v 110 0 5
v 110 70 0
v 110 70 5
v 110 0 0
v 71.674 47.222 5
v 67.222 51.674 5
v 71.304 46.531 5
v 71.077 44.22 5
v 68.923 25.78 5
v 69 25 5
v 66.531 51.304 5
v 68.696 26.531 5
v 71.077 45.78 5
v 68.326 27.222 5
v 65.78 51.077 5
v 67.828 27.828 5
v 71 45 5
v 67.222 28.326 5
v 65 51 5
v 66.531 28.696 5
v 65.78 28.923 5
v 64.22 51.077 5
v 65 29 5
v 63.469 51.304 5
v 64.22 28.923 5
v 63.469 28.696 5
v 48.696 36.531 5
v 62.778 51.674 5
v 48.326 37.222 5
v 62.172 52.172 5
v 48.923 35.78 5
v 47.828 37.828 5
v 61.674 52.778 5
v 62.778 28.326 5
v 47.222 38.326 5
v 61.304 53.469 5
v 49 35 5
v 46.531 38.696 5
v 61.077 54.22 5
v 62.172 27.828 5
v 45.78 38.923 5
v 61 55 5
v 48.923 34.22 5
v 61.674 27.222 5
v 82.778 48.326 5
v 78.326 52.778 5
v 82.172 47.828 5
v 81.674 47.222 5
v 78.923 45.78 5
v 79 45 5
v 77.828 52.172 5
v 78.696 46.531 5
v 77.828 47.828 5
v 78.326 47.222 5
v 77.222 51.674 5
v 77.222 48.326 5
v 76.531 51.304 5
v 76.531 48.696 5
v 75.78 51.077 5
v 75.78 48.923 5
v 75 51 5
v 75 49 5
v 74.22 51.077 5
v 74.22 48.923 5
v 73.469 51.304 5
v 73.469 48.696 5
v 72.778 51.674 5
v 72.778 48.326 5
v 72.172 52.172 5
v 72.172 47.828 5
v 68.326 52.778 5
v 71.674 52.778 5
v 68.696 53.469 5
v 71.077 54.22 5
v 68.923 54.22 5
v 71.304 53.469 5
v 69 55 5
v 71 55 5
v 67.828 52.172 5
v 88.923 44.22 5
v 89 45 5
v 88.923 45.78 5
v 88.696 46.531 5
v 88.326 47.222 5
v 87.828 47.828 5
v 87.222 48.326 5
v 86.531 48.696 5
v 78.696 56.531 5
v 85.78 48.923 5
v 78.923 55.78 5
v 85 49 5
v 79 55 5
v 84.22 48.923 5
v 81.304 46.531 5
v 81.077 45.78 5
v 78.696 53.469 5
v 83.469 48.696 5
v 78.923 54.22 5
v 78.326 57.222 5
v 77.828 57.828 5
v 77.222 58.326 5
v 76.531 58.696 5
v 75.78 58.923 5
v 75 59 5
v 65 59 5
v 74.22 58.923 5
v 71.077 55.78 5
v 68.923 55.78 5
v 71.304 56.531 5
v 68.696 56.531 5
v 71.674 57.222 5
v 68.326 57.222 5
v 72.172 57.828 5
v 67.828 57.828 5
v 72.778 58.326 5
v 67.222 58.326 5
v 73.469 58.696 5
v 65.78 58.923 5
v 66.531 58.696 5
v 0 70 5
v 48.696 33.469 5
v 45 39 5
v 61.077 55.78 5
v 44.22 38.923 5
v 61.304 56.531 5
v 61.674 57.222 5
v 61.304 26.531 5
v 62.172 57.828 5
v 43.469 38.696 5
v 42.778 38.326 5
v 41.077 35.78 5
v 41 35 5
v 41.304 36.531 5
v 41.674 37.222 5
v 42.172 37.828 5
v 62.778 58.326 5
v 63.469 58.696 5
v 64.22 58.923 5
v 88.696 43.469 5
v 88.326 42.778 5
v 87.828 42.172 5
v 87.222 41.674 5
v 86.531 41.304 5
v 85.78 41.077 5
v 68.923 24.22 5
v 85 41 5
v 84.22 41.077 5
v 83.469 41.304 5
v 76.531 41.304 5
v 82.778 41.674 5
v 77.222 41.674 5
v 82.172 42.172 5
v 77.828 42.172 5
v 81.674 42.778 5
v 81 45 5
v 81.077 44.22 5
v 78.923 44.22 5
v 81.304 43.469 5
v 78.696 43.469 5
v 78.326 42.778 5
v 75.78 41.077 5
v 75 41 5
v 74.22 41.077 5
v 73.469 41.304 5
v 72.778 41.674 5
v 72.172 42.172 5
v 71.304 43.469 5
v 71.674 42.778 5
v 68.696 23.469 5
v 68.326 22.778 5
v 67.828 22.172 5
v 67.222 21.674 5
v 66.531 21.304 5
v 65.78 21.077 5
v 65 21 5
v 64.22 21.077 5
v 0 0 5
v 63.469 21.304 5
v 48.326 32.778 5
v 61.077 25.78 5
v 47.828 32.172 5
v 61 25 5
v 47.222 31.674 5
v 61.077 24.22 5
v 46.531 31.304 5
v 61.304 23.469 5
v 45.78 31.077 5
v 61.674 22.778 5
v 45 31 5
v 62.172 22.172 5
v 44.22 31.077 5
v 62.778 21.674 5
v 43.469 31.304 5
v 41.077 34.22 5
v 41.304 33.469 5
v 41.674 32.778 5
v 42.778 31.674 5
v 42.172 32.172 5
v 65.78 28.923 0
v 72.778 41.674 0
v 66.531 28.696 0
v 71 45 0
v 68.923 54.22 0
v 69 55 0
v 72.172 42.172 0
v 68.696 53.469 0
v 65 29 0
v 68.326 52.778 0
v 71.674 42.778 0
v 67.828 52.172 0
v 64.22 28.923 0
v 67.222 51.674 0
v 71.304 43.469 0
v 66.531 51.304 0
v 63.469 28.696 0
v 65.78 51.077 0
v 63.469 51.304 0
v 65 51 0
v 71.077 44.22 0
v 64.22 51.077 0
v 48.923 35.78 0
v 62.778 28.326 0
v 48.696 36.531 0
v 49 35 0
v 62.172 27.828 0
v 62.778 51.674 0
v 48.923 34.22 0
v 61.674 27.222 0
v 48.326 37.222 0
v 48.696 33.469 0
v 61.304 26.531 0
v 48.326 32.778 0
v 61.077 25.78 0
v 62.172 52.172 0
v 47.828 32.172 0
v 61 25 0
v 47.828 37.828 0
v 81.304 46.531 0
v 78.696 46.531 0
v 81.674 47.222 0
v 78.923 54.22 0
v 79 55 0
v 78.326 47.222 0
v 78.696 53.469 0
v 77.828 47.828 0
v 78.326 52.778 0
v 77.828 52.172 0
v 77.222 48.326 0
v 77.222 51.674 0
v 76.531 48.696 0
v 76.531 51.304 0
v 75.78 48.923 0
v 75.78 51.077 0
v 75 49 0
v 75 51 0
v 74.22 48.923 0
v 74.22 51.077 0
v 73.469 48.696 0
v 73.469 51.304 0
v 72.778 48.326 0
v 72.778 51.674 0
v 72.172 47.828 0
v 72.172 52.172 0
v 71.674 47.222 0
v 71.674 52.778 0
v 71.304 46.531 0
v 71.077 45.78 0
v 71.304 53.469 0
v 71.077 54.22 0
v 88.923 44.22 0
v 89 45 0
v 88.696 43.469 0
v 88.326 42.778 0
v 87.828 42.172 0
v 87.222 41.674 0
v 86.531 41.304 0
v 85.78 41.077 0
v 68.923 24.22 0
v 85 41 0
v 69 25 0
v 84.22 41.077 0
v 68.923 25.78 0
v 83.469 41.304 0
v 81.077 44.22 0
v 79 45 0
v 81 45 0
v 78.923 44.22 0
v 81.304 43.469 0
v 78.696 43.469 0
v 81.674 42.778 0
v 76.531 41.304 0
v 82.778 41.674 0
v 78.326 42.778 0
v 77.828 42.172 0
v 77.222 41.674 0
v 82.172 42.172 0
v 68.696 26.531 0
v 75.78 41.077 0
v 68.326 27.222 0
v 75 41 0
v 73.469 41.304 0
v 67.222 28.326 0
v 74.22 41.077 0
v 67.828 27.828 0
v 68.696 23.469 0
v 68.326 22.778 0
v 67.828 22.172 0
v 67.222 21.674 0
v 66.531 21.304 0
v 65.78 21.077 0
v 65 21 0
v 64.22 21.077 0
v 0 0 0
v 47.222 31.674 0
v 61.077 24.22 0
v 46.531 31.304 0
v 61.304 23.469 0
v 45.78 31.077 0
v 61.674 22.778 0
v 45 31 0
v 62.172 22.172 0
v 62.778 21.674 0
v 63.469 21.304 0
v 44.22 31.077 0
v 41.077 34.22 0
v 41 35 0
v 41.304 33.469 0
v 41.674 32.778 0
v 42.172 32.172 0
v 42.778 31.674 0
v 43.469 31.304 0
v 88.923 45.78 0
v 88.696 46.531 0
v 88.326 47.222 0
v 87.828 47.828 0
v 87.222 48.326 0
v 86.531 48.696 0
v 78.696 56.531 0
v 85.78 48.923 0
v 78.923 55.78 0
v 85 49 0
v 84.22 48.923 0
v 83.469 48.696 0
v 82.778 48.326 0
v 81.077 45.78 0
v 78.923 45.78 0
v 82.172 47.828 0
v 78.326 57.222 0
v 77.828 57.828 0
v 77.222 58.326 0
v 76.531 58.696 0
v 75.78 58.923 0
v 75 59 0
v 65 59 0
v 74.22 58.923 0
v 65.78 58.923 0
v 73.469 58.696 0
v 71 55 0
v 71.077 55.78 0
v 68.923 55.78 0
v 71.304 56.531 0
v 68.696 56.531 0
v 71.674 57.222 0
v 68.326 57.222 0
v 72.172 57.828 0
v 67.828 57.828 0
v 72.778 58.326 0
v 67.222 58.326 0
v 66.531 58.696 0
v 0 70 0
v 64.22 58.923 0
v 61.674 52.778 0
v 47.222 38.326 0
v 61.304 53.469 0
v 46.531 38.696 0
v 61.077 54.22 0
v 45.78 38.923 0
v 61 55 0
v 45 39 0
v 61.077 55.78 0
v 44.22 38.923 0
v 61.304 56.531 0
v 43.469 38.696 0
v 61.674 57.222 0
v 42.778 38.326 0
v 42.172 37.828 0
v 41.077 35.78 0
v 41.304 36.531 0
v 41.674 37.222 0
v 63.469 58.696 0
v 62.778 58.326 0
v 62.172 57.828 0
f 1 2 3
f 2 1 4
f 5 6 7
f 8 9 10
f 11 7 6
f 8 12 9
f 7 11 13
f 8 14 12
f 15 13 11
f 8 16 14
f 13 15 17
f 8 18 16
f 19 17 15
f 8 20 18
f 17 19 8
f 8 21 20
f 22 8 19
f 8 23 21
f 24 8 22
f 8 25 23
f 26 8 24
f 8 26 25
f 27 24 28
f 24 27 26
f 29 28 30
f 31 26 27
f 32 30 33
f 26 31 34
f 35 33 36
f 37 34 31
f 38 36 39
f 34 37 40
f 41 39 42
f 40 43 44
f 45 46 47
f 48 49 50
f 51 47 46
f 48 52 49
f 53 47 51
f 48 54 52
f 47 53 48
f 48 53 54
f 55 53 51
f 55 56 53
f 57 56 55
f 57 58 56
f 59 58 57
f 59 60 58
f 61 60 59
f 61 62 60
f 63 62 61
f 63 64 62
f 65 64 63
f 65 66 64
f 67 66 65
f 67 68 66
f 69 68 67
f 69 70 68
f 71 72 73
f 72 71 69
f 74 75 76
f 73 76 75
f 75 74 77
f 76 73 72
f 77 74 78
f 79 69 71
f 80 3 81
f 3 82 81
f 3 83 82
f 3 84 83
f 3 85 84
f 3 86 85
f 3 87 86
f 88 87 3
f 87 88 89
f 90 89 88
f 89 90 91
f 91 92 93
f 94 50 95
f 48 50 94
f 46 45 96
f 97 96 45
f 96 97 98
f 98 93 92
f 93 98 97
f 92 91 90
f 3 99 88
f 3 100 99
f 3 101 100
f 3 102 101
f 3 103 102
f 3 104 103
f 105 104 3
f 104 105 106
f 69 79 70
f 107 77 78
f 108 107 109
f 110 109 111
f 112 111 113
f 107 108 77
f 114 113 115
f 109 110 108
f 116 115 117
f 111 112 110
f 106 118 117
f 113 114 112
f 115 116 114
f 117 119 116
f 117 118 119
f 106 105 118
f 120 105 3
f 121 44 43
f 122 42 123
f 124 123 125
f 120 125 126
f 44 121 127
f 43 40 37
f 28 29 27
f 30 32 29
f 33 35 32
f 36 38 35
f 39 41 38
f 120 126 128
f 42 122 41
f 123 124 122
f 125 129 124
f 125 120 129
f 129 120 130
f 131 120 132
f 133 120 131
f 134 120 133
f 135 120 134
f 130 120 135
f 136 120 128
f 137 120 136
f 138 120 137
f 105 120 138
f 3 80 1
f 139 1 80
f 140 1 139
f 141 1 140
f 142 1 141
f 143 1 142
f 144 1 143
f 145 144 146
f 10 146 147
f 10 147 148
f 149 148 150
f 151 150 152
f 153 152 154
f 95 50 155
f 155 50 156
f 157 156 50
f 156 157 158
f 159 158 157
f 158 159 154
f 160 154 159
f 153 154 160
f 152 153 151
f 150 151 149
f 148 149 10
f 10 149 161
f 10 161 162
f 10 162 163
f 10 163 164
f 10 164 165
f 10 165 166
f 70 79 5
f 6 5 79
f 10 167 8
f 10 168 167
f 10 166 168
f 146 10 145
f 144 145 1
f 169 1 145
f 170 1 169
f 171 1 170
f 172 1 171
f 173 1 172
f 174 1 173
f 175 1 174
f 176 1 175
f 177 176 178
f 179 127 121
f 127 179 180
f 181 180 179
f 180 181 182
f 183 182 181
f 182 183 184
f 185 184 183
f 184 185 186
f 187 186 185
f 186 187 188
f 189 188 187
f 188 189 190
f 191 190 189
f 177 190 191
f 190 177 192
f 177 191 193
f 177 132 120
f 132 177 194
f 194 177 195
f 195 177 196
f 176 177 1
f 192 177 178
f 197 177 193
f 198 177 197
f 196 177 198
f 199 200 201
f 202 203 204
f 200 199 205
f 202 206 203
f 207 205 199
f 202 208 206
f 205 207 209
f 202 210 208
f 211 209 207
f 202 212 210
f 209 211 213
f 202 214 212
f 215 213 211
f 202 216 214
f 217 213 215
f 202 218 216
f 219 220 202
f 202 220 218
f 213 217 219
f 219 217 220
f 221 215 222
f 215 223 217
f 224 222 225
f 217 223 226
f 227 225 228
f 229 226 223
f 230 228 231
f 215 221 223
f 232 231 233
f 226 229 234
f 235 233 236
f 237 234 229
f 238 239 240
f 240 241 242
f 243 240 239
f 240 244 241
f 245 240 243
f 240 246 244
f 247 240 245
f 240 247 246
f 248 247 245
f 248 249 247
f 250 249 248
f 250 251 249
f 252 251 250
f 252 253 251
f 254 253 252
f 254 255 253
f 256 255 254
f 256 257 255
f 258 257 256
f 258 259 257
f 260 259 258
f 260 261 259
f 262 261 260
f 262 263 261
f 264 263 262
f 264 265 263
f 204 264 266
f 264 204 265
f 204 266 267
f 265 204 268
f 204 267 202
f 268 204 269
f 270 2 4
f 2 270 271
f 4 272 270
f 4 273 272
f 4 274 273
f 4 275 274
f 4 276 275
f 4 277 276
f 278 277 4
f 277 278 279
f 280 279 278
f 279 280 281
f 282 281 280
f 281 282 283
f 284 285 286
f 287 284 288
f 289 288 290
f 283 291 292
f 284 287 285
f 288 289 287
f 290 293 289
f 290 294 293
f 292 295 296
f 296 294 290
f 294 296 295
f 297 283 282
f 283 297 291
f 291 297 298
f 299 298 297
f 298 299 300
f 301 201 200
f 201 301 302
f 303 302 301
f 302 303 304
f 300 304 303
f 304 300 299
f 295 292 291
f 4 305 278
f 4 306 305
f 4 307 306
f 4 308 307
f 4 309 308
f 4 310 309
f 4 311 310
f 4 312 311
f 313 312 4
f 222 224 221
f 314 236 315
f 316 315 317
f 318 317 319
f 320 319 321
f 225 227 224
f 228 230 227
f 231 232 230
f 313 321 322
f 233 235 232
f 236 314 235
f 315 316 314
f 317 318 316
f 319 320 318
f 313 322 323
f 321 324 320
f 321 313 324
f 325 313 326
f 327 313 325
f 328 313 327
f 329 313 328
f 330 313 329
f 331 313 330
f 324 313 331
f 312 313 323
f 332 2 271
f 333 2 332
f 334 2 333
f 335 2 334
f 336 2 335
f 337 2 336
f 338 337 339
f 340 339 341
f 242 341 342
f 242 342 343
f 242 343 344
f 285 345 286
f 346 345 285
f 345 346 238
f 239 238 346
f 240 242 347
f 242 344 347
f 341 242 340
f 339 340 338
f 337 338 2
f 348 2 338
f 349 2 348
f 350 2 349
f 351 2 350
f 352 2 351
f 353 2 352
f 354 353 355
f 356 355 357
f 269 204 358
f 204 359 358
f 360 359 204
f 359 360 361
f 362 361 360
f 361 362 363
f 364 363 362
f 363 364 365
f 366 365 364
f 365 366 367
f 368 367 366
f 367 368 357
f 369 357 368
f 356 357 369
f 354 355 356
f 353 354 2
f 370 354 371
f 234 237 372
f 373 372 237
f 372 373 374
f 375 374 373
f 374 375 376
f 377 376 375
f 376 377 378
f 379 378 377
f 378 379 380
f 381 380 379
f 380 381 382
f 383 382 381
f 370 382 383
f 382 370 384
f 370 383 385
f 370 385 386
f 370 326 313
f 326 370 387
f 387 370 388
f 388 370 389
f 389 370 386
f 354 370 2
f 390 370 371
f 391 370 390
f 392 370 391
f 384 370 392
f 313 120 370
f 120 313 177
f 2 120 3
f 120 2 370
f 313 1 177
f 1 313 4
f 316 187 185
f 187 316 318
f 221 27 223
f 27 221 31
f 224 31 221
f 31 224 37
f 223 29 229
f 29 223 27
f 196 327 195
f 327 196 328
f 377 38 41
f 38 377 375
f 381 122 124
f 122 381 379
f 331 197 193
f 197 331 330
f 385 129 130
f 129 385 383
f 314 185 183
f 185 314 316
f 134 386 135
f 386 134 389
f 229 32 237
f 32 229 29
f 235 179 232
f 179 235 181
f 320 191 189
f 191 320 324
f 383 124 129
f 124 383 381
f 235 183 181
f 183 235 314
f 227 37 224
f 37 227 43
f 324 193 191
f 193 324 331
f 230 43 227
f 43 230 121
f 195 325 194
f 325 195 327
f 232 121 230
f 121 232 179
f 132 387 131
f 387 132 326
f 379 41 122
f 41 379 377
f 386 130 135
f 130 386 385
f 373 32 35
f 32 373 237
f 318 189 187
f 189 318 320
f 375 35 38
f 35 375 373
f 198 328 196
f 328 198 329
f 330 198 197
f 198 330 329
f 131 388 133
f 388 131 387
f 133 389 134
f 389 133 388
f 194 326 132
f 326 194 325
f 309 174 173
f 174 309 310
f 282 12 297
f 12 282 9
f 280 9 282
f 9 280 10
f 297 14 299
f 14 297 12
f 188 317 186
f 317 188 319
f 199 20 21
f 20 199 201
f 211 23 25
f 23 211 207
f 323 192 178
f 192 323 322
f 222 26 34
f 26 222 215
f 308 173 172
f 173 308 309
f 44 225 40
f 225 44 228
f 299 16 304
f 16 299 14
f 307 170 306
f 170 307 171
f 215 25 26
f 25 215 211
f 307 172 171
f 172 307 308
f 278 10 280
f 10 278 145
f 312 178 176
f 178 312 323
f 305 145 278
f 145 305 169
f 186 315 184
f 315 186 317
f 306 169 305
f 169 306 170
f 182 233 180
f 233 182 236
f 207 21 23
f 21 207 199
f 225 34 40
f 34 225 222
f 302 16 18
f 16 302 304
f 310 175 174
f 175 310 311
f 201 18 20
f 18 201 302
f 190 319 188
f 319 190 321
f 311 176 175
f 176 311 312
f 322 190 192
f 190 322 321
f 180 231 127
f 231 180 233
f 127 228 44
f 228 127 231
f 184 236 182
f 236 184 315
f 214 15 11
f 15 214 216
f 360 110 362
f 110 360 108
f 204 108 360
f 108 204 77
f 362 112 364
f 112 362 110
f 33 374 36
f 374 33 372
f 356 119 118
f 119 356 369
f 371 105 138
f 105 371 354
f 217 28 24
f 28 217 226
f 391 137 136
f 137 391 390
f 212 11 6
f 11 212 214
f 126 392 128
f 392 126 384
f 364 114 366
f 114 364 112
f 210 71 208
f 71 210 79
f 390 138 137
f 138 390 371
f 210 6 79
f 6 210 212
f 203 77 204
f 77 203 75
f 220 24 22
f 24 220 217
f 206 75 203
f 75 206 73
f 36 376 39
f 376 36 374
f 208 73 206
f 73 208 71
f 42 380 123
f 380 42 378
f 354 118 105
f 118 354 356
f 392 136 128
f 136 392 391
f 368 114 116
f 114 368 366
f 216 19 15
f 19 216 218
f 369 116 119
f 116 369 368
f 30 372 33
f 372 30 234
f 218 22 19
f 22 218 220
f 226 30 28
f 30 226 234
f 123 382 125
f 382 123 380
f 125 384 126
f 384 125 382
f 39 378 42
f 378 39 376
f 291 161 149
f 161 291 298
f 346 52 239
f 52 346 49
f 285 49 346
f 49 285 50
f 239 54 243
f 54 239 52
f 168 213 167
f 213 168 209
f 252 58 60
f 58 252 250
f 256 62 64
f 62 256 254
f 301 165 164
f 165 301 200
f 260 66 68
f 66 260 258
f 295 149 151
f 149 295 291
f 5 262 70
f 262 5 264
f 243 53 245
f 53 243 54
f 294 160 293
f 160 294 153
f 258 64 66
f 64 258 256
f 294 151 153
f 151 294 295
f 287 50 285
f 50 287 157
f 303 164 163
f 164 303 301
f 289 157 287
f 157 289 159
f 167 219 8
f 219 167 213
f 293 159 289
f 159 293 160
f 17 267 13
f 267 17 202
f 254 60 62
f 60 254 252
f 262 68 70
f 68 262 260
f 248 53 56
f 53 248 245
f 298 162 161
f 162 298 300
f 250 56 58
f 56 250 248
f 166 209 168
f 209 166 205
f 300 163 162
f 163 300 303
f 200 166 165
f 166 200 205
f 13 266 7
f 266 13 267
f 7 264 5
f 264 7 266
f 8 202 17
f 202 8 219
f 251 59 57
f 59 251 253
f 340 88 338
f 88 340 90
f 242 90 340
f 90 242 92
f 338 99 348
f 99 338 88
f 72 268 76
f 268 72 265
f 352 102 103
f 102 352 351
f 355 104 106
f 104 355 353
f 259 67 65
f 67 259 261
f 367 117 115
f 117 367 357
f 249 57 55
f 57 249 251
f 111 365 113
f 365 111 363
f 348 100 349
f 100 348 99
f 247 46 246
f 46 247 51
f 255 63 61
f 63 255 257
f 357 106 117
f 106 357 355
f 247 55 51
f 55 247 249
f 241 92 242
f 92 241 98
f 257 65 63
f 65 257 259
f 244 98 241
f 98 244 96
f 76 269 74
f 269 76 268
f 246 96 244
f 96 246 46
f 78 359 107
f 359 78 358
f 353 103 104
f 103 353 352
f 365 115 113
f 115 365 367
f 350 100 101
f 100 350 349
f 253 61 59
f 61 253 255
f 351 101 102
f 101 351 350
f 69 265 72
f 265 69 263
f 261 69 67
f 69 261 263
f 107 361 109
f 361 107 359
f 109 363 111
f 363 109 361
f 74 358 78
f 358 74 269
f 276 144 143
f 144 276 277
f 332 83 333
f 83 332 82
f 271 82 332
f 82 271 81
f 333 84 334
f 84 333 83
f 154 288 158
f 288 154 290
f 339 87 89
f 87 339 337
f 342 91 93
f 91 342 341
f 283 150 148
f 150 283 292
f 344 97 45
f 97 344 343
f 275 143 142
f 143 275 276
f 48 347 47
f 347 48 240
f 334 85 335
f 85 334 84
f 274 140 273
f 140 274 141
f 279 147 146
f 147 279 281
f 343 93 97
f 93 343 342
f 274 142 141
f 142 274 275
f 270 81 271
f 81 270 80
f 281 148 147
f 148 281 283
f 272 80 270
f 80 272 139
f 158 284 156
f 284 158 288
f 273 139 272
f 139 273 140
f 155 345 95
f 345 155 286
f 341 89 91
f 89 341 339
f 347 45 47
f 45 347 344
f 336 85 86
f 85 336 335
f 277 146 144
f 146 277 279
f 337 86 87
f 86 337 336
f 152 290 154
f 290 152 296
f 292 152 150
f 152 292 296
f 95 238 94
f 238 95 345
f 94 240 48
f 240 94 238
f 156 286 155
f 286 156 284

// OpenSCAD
$fn = 32;

// ----------------------------------------------------------------------
// Hole field: plate with holes at given coordinates
// ----------------------------------------------------------------------

// --- parameters (mm) ---
plate_l = 110;            // plate length, X
plate_w = 70;             // plate width, Y
plate_t = 5;              // plate thickness, Z
hole_d = 8;               // hole diameter

difference() {
  cube([plate_l, plate_w, plate_t]);
  translate([45, 35, -1]) cylinder(h = plate_t + 2, d = hole_d);
  translate([65, 25, -1]) cylinder(h = plate_t + 2, d = hole_d);
  translate([65, 55, -1]) cylinder(h = plate_t + 2, d = hole_d);
  translate([75, 45, -1]) cylinder(h = plate_t + 2, d = hole_d);
  translate([75, 55, -1]) cylinder(h = plate_t + 2, d = hole_d);
  translate([85, 45, -1]) cylinder(h = plate_t + 2, d = hole_d);
}
